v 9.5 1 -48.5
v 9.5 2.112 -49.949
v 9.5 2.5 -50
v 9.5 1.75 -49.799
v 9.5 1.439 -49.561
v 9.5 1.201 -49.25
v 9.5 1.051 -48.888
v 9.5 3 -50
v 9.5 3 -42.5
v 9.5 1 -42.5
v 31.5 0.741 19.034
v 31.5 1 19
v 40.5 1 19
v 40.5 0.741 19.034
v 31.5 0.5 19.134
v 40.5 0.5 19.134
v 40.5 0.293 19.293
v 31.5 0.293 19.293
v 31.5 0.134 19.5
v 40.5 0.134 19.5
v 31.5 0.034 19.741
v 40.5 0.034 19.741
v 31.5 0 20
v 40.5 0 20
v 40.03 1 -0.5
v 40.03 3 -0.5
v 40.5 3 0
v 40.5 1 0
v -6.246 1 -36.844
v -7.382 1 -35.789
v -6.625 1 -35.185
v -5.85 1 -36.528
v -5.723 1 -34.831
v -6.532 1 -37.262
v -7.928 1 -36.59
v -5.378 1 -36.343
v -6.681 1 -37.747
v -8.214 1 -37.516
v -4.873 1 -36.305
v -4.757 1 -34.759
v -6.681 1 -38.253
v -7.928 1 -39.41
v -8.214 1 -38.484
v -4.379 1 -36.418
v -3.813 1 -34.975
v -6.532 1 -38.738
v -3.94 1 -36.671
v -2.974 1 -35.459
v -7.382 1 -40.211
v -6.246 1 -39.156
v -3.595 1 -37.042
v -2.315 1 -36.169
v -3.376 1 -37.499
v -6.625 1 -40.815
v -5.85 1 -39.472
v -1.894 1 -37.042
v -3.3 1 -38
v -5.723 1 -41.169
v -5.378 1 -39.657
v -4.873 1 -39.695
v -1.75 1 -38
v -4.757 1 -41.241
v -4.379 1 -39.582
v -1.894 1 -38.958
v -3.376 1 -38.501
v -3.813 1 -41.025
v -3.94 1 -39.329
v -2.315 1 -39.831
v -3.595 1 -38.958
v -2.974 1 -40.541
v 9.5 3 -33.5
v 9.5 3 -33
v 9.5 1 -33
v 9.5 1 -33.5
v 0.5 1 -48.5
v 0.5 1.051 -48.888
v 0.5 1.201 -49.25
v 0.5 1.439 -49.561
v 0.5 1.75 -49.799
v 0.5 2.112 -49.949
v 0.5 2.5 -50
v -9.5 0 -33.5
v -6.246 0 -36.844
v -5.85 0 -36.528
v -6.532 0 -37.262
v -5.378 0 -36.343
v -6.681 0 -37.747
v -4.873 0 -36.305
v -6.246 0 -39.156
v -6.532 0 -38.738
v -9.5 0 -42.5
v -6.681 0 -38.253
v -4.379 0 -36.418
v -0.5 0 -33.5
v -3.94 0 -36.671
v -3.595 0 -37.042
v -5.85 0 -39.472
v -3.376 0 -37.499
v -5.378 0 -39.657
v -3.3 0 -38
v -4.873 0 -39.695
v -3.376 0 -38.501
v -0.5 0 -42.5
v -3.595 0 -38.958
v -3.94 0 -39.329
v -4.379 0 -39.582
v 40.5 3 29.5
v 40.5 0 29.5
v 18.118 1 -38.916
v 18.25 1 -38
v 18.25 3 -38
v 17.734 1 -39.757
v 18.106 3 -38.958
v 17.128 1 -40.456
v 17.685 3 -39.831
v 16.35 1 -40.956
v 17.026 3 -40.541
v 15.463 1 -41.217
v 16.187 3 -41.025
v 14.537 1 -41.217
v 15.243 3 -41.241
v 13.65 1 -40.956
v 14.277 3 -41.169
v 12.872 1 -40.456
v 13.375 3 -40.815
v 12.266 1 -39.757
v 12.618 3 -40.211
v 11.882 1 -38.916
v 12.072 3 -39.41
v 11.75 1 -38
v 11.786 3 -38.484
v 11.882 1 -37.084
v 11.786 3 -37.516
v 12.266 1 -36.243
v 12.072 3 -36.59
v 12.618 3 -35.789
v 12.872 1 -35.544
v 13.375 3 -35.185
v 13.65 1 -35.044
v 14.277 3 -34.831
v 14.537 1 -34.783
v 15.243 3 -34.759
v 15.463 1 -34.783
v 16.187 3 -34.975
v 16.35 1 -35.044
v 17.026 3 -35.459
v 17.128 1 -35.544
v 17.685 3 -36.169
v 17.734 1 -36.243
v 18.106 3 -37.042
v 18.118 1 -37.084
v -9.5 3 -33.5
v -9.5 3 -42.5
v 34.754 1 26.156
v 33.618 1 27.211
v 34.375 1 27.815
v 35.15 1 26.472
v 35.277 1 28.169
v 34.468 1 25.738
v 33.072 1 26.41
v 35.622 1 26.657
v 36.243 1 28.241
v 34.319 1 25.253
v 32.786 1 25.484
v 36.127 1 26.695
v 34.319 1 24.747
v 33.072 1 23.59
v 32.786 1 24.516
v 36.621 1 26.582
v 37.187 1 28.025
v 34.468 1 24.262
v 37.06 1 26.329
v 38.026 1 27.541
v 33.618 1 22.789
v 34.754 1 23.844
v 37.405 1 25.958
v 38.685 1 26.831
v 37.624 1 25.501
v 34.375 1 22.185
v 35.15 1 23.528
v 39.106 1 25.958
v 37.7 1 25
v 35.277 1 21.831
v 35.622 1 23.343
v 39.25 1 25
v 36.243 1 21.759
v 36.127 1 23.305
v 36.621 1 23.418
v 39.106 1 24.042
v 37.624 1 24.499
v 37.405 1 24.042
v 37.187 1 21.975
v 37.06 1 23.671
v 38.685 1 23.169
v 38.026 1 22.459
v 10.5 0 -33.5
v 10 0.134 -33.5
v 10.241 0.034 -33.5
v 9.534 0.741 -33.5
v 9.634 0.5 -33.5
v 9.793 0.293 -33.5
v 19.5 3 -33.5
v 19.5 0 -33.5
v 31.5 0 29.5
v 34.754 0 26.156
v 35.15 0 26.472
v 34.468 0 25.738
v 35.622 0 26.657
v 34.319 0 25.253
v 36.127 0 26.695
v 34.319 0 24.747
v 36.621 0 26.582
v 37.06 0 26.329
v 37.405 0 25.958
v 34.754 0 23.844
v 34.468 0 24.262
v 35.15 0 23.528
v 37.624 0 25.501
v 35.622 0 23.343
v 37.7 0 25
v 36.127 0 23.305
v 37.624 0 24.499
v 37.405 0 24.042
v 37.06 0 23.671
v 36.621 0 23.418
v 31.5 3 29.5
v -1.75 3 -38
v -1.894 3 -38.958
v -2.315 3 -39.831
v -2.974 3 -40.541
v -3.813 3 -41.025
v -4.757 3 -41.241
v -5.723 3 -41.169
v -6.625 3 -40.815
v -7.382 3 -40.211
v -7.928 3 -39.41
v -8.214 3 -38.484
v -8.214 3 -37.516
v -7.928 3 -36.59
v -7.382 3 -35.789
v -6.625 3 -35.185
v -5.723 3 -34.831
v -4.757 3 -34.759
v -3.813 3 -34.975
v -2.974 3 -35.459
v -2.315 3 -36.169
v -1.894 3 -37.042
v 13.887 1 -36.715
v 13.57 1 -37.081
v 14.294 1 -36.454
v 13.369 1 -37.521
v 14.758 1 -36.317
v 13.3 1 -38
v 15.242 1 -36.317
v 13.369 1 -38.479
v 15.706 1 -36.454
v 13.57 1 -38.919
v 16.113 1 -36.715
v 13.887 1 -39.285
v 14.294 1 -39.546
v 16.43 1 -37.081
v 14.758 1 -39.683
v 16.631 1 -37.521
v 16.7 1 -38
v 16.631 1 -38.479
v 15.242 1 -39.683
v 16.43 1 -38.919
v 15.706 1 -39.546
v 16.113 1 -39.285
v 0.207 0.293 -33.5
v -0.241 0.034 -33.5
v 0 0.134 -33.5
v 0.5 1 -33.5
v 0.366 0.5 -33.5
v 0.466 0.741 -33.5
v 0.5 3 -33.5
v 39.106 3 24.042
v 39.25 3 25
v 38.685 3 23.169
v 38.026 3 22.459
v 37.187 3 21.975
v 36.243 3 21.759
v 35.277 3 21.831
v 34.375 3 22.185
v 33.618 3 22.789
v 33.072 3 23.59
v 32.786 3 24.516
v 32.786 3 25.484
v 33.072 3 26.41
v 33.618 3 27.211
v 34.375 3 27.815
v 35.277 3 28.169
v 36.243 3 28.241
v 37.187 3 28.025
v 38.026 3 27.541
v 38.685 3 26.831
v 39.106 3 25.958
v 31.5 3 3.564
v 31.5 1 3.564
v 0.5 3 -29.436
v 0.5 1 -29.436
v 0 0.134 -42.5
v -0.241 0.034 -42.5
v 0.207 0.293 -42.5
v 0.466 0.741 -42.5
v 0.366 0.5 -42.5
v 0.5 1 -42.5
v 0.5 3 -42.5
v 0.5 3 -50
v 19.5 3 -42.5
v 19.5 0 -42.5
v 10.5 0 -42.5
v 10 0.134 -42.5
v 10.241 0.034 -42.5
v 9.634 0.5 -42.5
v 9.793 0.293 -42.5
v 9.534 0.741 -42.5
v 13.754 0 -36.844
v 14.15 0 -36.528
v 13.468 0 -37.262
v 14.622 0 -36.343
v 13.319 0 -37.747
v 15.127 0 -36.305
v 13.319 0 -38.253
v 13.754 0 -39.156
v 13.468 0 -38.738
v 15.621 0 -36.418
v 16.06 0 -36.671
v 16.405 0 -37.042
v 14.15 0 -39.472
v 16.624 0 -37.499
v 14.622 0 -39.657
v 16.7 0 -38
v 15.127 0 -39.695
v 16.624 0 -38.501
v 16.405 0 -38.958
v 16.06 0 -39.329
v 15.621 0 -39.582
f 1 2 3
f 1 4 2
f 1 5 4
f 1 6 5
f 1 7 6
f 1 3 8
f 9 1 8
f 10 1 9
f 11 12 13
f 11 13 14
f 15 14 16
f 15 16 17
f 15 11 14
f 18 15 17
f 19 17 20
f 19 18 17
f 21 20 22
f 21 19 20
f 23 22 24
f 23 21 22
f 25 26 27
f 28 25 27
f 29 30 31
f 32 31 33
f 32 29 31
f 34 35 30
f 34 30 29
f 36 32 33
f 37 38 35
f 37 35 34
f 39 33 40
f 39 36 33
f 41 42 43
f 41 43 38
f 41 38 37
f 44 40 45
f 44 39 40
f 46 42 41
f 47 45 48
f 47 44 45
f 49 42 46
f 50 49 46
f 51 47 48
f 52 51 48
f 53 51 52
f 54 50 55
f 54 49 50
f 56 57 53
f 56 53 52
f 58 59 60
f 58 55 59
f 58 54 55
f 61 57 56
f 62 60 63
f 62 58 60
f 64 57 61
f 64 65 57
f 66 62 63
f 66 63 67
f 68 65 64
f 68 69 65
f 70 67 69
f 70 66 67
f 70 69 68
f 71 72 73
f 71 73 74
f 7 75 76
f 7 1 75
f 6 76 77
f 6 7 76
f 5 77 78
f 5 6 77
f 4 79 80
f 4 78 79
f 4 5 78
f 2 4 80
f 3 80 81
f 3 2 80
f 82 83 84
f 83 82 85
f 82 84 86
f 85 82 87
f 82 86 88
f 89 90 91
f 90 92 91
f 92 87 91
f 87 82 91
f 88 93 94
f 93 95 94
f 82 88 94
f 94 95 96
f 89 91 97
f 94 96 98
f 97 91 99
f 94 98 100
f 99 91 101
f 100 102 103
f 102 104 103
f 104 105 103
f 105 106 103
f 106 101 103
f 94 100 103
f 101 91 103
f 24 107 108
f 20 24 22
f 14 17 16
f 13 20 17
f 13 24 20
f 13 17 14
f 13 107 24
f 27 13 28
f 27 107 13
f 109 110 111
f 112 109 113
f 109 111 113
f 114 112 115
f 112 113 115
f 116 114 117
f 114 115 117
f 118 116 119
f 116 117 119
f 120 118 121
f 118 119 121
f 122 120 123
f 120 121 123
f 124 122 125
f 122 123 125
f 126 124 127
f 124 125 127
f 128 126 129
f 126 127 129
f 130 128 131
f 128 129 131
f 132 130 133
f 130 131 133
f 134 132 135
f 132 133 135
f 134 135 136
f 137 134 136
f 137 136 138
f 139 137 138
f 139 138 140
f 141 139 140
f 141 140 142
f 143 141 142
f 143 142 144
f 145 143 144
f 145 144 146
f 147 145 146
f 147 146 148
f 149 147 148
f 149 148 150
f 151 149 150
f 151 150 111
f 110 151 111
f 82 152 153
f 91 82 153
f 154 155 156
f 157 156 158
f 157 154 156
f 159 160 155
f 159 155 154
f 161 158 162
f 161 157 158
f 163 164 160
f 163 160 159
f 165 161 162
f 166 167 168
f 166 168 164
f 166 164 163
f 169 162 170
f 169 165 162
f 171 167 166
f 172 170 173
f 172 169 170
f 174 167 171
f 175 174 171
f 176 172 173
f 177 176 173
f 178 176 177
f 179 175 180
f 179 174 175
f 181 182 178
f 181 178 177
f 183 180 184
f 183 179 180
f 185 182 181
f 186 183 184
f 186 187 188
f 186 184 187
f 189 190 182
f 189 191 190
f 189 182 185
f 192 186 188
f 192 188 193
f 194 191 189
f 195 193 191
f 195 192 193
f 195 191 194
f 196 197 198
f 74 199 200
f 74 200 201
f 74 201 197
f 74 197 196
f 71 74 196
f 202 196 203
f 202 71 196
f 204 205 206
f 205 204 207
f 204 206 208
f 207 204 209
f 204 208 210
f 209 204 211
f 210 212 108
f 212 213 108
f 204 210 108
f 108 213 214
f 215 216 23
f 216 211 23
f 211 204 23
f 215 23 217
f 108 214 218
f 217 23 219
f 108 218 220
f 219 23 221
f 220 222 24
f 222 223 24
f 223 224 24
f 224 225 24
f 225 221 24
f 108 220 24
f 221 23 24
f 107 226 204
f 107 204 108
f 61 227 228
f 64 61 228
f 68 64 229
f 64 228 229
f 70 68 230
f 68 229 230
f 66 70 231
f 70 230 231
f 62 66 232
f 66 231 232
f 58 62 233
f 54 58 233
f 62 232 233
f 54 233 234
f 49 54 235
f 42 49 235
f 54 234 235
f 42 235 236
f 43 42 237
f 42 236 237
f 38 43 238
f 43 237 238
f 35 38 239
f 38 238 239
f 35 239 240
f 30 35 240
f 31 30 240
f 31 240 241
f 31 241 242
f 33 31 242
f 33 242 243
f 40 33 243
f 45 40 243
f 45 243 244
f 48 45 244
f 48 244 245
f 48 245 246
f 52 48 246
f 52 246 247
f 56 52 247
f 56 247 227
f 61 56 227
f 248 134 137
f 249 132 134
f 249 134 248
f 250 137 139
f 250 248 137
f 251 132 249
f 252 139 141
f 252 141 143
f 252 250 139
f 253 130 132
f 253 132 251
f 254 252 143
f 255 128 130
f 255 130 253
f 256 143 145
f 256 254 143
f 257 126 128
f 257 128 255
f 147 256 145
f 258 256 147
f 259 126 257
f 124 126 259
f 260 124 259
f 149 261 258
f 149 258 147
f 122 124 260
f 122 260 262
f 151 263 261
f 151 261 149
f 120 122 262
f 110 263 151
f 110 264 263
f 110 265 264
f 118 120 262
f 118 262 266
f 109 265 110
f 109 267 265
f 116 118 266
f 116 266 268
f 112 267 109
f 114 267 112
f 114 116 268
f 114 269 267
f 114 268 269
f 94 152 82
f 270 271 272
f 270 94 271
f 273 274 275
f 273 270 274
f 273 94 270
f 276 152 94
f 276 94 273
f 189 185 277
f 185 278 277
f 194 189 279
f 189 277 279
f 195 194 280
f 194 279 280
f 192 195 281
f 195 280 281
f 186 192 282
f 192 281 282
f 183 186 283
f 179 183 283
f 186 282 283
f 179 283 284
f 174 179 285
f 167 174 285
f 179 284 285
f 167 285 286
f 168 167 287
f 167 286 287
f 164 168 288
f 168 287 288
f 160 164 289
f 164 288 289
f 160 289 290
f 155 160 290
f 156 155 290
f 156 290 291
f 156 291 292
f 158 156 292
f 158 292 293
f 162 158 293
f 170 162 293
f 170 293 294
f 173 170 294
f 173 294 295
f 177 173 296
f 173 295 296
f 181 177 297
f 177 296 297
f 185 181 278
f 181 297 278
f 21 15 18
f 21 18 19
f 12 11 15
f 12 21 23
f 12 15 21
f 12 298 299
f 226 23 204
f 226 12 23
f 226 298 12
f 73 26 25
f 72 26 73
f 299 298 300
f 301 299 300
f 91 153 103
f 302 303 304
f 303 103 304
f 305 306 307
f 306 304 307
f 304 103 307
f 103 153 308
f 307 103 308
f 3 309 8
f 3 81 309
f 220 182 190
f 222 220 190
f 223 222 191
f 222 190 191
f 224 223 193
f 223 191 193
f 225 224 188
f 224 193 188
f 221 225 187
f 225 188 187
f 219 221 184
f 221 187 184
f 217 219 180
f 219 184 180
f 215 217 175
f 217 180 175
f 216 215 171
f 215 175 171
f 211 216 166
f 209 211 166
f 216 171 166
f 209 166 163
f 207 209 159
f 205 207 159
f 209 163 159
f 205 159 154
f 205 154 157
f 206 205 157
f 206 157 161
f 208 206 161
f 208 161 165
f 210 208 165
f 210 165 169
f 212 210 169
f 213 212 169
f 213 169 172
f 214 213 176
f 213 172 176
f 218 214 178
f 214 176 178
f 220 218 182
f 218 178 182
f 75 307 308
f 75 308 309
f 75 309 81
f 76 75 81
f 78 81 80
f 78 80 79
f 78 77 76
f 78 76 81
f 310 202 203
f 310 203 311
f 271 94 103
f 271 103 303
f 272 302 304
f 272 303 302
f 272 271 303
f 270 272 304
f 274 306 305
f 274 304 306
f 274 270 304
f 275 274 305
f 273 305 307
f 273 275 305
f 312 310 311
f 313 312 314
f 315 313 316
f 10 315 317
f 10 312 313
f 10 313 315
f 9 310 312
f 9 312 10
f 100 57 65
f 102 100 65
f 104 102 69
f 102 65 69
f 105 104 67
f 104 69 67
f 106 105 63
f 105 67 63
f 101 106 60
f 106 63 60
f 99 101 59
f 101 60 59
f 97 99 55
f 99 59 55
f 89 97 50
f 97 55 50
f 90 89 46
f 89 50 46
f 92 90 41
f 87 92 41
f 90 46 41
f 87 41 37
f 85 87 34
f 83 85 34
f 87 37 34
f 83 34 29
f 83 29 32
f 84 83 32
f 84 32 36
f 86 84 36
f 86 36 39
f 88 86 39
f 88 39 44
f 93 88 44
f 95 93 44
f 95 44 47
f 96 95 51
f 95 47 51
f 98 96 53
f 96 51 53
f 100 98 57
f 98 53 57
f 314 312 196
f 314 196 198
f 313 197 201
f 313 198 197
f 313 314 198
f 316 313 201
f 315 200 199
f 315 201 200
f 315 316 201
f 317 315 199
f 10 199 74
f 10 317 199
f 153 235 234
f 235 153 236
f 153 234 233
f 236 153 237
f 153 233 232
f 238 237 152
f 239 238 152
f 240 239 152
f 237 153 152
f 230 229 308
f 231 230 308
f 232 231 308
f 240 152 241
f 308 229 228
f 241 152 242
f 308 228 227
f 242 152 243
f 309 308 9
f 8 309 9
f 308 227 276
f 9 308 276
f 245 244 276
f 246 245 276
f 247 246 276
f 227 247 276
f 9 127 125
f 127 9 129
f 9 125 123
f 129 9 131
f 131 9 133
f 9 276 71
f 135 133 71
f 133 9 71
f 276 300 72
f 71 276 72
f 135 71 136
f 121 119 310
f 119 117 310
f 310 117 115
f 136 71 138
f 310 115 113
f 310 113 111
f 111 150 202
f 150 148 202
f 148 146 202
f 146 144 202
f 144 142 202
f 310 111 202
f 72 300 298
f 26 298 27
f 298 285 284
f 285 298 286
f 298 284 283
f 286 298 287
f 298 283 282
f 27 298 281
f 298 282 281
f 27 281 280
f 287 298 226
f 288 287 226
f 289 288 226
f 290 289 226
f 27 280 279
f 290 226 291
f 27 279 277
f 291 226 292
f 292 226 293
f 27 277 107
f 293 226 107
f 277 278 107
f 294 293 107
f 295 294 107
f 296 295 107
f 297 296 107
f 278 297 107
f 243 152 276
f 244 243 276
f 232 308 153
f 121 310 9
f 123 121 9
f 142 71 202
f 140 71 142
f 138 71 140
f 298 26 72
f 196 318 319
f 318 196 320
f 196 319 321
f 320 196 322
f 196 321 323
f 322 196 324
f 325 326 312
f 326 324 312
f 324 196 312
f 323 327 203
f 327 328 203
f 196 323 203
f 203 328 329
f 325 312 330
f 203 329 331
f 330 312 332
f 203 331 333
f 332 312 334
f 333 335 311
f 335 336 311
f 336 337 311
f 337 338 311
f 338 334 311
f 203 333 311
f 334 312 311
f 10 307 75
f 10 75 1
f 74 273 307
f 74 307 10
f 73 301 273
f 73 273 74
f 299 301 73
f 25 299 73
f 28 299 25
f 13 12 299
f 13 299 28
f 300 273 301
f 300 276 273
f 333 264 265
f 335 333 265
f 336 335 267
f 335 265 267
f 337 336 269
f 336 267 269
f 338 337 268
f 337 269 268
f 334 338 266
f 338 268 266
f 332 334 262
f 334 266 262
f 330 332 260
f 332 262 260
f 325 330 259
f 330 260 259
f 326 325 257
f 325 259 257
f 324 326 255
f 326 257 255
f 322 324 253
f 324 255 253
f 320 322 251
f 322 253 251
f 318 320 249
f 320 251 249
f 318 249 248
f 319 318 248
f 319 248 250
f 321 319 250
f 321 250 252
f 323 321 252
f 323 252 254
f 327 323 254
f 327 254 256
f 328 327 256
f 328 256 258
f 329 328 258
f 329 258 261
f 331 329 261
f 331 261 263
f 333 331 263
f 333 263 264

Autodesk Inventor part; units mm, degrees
ref_plane "YZ Plane" through (0, 0, 0) normal (1, 0, 0) x (0, 1, 0)
ref_plane "XZ Plane" through (0, 0, 0) normal (0, 1, 0) x (-1, 0, 0)
ref_plane "XY Plane" through (0, 0, 0) normal (0, 0, 1) x (1, 0, 0)
sketch "Sketch1" plane through (0, 0, 0) normal (0, 1, 0) x (-1, 0, 0)
  line L0 (0, 0) -> (-10, 0)
  line L1 (-10, 0) -> (-10, -51)
  line L2 (-10, -51) -> (0, -51)
  line L3 (0, -51) -> (0, 0)
  line L4 (0, 0) -> (-41, 0)
  line L5 (-41, 0) -> (-41, -10)
  line L6 (-41, -10) -> (0, -10)
  line L7 (0, -10) -> (0, 0)
  line L8 (-41, -10) -> (-31, -10)
  line L9 (-31, -10) -> (-31, 30)
  line L10 (-31, 30) -> (-41, 30)
  line L11 (-41, 30) -> (-41, -10)
  line L12 (-10, -51) -> (-10, -43)
  line L13 (-10, -43) -> (-20, -43)
  line L14 (-20, -43) -> (10, -43)
  line L15 (10, -43) -> (10, -33)
  line L16 (10, -33) -> (-20, -33)
  line L17 (-20, -33) -> (-20, -43)
  point P0 (0, -43)
  point P1 (0, -33)
  point P2 (-31, 0)
  point P3 (-10, -10)
  point P4 (-10, -33)
  dimension "d0" = 10
  dimension "d1" = 51
  dimension "d2" = 41
  dimension "d3" = 10
  dimension "d4" = 10
  dimension "d5" = 40
  dimension "d6" = 8
  dimension "d7" = 10
  dimension "d8" = 30
  dimension "d9" = 10
extrude "Extrusion1" add sketch "Sketch1" along normal blind 3
sketch "Sketch2" plane through (0, 3, 0) normal (0, 1, 0) x (1, 0, 0)
  line L0 (-10, 33) -> (0, 33) projected
  line L1 (0, 33) -> (0, 38)
  line L2 (0, 38) -> (-5, 38)
  circle A0 centre (-5, 38) radius 3.25
  line L3 (0, 38) -> (15, 38)
  circle A1 centre (15, 38) radius 3.25
  line L4 (41, -30) -> (41, 10) projected
  line L5 (41, -30) -> (41, -25)
  line L6 (41, -25) -> (41, -30)
  line L7 (41, -25) -> (36, -25)
  circle A2 centre (36, -25) radius 3.25
  circle A3 centre (-5, 38) radius 1.7
  circle A4 centre (15, 38) radius 1.7
  circle A5 centre (36, -25) radius 1.7
  point P0 (0, 0)
  dimension "d12" = 5
  dimension "d13" = 5
  dimension "d14" = 6.5
  dimension "d15" = 15
  dimension "d16" = 6.5
  dimension "d17" = 5
  dimension "d18" = 5
  dimension "d19" = 5
  dimension "d20" = 6.5
  dimension "d23" = 3.4
  dimension "d24" = 3.4
  dimension "d25" = 3.4
extrude "Extrusion3" cut sketch "Sketch2" against normal blind 2
extrude "Extrusion4" cut sketch "Sketch2" against normal blind 4 contours A3 | A4 | A5
sketch "Sketch3" plane through (0, 3, 0) normal (0, 1, 0) x (1, 0, 0)
  line L0 (0, 0) -> (0, 0.5)
  line L1 (0, 33) -> (0, 0) projected
  line L2 (0, 0.5) -> (31, 0.5)
  line L3 (31, 0.5) -> (31.5, 0.5)
  line L4 (31.5, 0.5) -> (31.5, -21.5)
  line L5 (31.5, -21.5) -> (40.5, -21.5)
  line L6 (31, -30) -> (41, -30) projected
  line L7 (40.5, -21.5) -> (40.5, 9.5)
  line L8 (41, -30) -> (41, 10) projected
  line L9 (40.5, 9.5) -> (9.5, 9.5)
  line L10 (9.5, 9.5) -> (9.5, 33.5)
  line L11 (9.5, 33.5) -> (19.5, 33.5)
  line L12 (20, 33) -> (20, 43) projected
  line L13 (19.5, 33.5) -> (19.5, 42.5)
  line L14 (19.5, 42.5) -> (9.5, 42.5)
  line L15 (9.5, 42.5) -> (9.5, 51)
  line L16 (10, 51) -> (0, 51) projected
  line L17 (10, 43) -> (10, 51) projected
  line L18 (9.5, 51) -> (10, 51)
  line L19 (10, 51) -> (10, 43)
  line L20 (20, 43) -> (10, 43) projected
  line L21 (20, 43) -> (10, 43)
  line L22 (10, 33) -> (20, 33) projected
  line L23 (20, 43) -> (20, 33)
  line L24 (20, 33) -> (10, 33)
  line L25 (10, 33) -> (10, 10)
  line L26 (41, 10) -> (10, 10) projected
  line L27 (10, 10) -> (41, 10)
  line L28 (41, 10) -> (41, -30)
  line L29 (31, 0) -> (31, -30) projected
  line L30 (41, -30) -> (31, -30)
  line L31 (31, -30) -> (31, 0)
  line L32 (31, 0) -> (0, 0)
  line L33 (0, 0.5) -> (0.5, 0.5)
  line L34 (0.5, 0.5) -> (0.5, 33.5)
  line L35 (9.5, 11.7035) -> (0.5, 11.7035)
  line L36 (5, 11.7035) -> (5, 17)
  line L37 (0.5, 9.5) -> (0.5, 33.5)
  line L38 (0.5, 33.5) -> (-9.5, 33.5)
  line L39 (-10, 33) -> (-10, 43)
  line L40 (-9.5, 33.5) -> (-9.5, 42.5)
  line L41 (-9.5, 42.5) -> (0.5, 42.5)
  line L42 (0.5, 42.5) -> (0.5, 51)
  line L43 (0, 51) -> (10, 51)
  line L44 (0, 43) -> (0, 51)
  line L45 (0.5, 51) -> (0, 51)
  line L46 (0, 51) -> (0, 43)
  line L47 (-10, 43) -> (0, 43)
  line L48 (-10, 43) -> (0, 43)
  line L49 (0, 33) -> (-10, 33)
  line L50 (-10, 43) -> (-10, 33)
  line L51 (-10, 33) -> (0, 33)
  line L52 (0, 33) -> (0, 10)
  line L53 (0, 0) -> (0.5, 0)
  line L54 (0.5, 0) -> (0.5, 33.5)
  line L55 (0.5, 33.5) -> (0, 33.5)
  line L56 (0, 33.5) -> (0, 0)
  dimension "d30" = 0.5
  dimension "d31" = 31
  dimension "d32" = 90
  dimension "d33" = 0.5
  dimension "d34" = 22
  dimension "d35" = 9
  dimension "d36" = 90
  dimension "d37" = 31
  dimension "d38" = 90
  dimension "d39" = 31
  dimension "d40" = 24
  dimension "d41" = 10
  dimension "d42" = 9
  dimension "d43" = 0.5
extrude "Extrusion5" cut sketch "Sketch3" against normal blind 4 contours L0 L2 L54 L32 | L1 L56 L38 L34 L2 | L54 L2 L3 L4 L5 L7 L9 L10 L11 L13 L14 L15 L16 L17 L20 L12 L22 L25 L26 L8 L6 L29 L32 | L49 L39 L47 L44 L16 L42 L41 L40 L38 L56
sketch "Sketch4" plane through (0, 3, 0) normal (0, 1, 0) x (1, 0, 0)
  line L0 (40.5, 9.5) -> (40.5, 38.6053)
  line L1 (9.5, 33.5) -> (46.5578, 33.5)
  line L2 (40.5, 33.5) -> (40.5, 0.5)
  line L3 (40.5, 9.5) -> (40.5, -21.5) projected
  line L4 (9.5, 9.5) -> (9.5, 33.5) projected
  line L5 (40.5, 0) -> (9.5, 33)
  line L6 (40.5, 0) -> (33.9404, -6.1621)
  line L7 (33.9404, -6.1621) -> (-17.219, 48.2979)
  line L8 (0.5, 33.5) -> (0.5, 0.5) projected
  line L9 (0.5, 33) -> (0.5, 28.5562)
  line L10 (19.5, 33.5) -> (9.5, 33.5) projected
  line L11 (9.5, 33) -> (0.5, 33)
  line L12 (9.5, 33.5) -> (9.5, 33)
  line L13 (9.5, 33.5) -> (9.5, 9.5) projected
  point P0 (0, 0)
  point P1 (0.5, 29.4357)
  point P2 (0.5, 33)
  dimension "d49" = 33
  dimension "d50" = 9
  dimension "d55" = 0.5
sketch "Sketch5" plane through (0, 3, 0) normal (0, 1, 0) x (1, 0, 0)
  line L0 (0.5, 33.5) -> (31.5, 33.5)
  line L1 (31.5, 33.5) -> (31.5, 9.5)
  line L2 (31.5, 0.5) -> (0.5, 0.5)
  line L3 (0.5, 0.5) -> (0.5, 33.5)
  line L4 (9.5, 9.5) -> (40.5, 9.5) projected
  line L5 (31.5, 0.5) -> (40.5, 0.5)
  line L6 (40.5, 0.5) -> (40.5, 9.5)
  line L7 (40.5, 9.5) -> (31.5, 9.5)
  point P0 (0, 0)
extrude "Extrusion6" cut sketch "Sketch5" against normal blind 4
extrude "Extrusion7" add sketch "Sketch4" against normal blind 3 contours L6 L7 L4 L5 | L4 L7 L8 L11
sketch "Sketch6" plane through (0, 3, 0) normal (0, 1, 0) x (1, 0, 0)
  line L0 (40.0303, 0.5) -> (9.5, 33) projected
  line L1 (33.4215, 7.5352) -> (47.7617, -7.7302)
  line L2 (47.7617, -7.7302) -> (49.311, 2.3426)
  line L3 (49.311, 2.3426) -> (33.4215, 7.5352)
  line L4 (9.5, 33) -> (0.5, 33) projected
  line L5 (-9.5, 33.5) -> (19.5, 33.5) projected
  line L6 (0.5, 33) -> (9.5, 33)
  line L7 (9.5, 33) -> (9.5, 33.5)
  line L8 (9.5, 33.5) -> (0.5, 33.5)
  line L9 (0.5, 33.5) -> (0.5, 33)
  point P0 (0, 0)
extrude "Extrusion8" add sketch "Sketch6" against normal blind 3 contours L4 L9 L5 L7
sketch "Sketch7" plane through (0, 3, 0) normal (0, 1, 0) x (1, 0, 0)
  line L0 (9.5, 33) -> (40.0303, 0.5) projected
  line L1 (37.6071, 3.0795) -> (42.3492, -1.9686)
  line L2 (42.3492, -1.9686) -> (43.0836, 1.6709)
  line L3 (43.0836, 1.6709) -> (37.6071, 3.0795)
  point P0 (0, 0)
  point P1 (40.0303, 0.5)
extrude "Extrusion9" cut sketch "Sketch7" against normal blind 3
sketch "Sketch10" plane through (0, 3, 0) normal (0, 1, 0) x (1, 0, 0)
  line L0 (40.5, -21.5) -> (31.5, -21.5)
  line L1 (31.5, -21.5) -> (31.5, -29.5)
  line L2 (31.5, -29.5) -> (40.5, -29.5)
  line L3 (40.5, -29.5) -> (40.5, -21.5)
  point P0 (0, 0)
  dimension "d60" = 9
  dimension "d61" = 8
extrude "Extrusion10" add sketch "Sketch10" against normal blind 3
sketch "Sketch11" plane through (0, 3, 0) normal (0, 1, 0) x (1, 0, 0)
  line L0 (31.5, -29.5) -> (40.5, -29.5) projected
  line L1 (36, -29.5) -> (36, -25)
  circle A0 centre (36, -25) radius 1.7
  point P0 (0, 0)
  dimension "d64" = 4.5
  dimension "d65" = 3.4
extrude "Extrusion11" cut sketch "Sketch11" against normal blind 3
sketch "Sketch12" plane through (0, 3, 0) normal (0, 1, 0) x (1, 0, 0)
  circle A0 centre (36, -25) radius 1.7 projected
  circle A1 centre (36, -25) radius 3.25
  point P0 (0, 0)
  dimension "d68" = 6.5
extrude "Extrusion12" cut sketch "Sketch12" against normal blind 2
sketch "Sketch13" plane through (0, 3, 0) normal (0, 1, 0) x (1, 0, 0)
  line L0 (9.5, 51) -> (9.5, 42.5) projected
  line L1 (0.5, 42.5) -> (0.5, 51) projected
  line L2 (9.5, 51) -> (0.5, 51)
  line L3 (0.5, 51) -> (0.5, 48.5)
  line L4 (0.5, 48.5) -> (9.5, 48.5)
  line L5 (9.5, 48.5) -> (9.5, 51)
  point P0 (0, 0)
  point P1 (9.5, 48.5)
  dimension "d71" = 2.5
extrude "Extrusion13" cut sketch "Sketch13" against normal blind 3
sketch "Sketch14" plane through (0, 0, 0) normal (0, -1, 0) x (1, 0, 0)
  line L0 (9.5, -48.5) -> (0.5, -48.5) projected
  line L1 (9.5, -48.5) -> (0.5, -48.5)
  line L2 (0.5, -48.5) -> (0.5, -29.4357)
  line L3 (0.5, -29.4357) -> (9.5, -29.4357)
  line L4 (9.5, -29.4357) -> (9.5, -48.5)
  line L5 (-9.5, -33.5) -> (0.5, -33.5) projected
  line L6 (40.5, 29.5) -> (40.5, 0) projected
  line L7 (0.5, -33.5) -> (40.5, -33.5)
  line L8 (40.5, -33.5) -> (40.5, 19)
  line L9 (40.5, 19) -> (0.5, 19)
  line L10 (0.5, 19) -> (0.5, -33.5)
  point P0 (0, 0)
  point P1 (9.5, -33.5)
  point P2 (40.5, 0)
  dimension "d76" = 52.5
extrude "Extrusion14" cut sketch "Sketch14" against normal blind 1
fillet "Fillet4" radius 1 3 edges at (0.5, 0, -38) (9.5, 0, -38) (36, 0, 19)
sketch "Sketch15" plane through (0, 1, 0) normal (0, -1, 0) x (1, 0, 0)
  line L0 (9.5, -42.5) -> (9.5, -48.5) projected
  line L1 (9.5, -48.5) -> (0.5, -48.5)
  line L2 (0.5, -48.5) -> (0.5, -50)
  line L3 (0.5, -50) -> (9.5, -50)
  line L4 (9.5, -50) -> (9.5, -48.5)
  point P0 (0, 0)
  dimension "d81" = 9
  dimension "d82" = 1.5
extrude "Extrusion15" add sketch "Sketch15" against normal blind 2
fillet "Fillet6" radius 1.5 1 edges at (5, 1, -50)
properties part number "Cover_bottom_raceway_cover"
